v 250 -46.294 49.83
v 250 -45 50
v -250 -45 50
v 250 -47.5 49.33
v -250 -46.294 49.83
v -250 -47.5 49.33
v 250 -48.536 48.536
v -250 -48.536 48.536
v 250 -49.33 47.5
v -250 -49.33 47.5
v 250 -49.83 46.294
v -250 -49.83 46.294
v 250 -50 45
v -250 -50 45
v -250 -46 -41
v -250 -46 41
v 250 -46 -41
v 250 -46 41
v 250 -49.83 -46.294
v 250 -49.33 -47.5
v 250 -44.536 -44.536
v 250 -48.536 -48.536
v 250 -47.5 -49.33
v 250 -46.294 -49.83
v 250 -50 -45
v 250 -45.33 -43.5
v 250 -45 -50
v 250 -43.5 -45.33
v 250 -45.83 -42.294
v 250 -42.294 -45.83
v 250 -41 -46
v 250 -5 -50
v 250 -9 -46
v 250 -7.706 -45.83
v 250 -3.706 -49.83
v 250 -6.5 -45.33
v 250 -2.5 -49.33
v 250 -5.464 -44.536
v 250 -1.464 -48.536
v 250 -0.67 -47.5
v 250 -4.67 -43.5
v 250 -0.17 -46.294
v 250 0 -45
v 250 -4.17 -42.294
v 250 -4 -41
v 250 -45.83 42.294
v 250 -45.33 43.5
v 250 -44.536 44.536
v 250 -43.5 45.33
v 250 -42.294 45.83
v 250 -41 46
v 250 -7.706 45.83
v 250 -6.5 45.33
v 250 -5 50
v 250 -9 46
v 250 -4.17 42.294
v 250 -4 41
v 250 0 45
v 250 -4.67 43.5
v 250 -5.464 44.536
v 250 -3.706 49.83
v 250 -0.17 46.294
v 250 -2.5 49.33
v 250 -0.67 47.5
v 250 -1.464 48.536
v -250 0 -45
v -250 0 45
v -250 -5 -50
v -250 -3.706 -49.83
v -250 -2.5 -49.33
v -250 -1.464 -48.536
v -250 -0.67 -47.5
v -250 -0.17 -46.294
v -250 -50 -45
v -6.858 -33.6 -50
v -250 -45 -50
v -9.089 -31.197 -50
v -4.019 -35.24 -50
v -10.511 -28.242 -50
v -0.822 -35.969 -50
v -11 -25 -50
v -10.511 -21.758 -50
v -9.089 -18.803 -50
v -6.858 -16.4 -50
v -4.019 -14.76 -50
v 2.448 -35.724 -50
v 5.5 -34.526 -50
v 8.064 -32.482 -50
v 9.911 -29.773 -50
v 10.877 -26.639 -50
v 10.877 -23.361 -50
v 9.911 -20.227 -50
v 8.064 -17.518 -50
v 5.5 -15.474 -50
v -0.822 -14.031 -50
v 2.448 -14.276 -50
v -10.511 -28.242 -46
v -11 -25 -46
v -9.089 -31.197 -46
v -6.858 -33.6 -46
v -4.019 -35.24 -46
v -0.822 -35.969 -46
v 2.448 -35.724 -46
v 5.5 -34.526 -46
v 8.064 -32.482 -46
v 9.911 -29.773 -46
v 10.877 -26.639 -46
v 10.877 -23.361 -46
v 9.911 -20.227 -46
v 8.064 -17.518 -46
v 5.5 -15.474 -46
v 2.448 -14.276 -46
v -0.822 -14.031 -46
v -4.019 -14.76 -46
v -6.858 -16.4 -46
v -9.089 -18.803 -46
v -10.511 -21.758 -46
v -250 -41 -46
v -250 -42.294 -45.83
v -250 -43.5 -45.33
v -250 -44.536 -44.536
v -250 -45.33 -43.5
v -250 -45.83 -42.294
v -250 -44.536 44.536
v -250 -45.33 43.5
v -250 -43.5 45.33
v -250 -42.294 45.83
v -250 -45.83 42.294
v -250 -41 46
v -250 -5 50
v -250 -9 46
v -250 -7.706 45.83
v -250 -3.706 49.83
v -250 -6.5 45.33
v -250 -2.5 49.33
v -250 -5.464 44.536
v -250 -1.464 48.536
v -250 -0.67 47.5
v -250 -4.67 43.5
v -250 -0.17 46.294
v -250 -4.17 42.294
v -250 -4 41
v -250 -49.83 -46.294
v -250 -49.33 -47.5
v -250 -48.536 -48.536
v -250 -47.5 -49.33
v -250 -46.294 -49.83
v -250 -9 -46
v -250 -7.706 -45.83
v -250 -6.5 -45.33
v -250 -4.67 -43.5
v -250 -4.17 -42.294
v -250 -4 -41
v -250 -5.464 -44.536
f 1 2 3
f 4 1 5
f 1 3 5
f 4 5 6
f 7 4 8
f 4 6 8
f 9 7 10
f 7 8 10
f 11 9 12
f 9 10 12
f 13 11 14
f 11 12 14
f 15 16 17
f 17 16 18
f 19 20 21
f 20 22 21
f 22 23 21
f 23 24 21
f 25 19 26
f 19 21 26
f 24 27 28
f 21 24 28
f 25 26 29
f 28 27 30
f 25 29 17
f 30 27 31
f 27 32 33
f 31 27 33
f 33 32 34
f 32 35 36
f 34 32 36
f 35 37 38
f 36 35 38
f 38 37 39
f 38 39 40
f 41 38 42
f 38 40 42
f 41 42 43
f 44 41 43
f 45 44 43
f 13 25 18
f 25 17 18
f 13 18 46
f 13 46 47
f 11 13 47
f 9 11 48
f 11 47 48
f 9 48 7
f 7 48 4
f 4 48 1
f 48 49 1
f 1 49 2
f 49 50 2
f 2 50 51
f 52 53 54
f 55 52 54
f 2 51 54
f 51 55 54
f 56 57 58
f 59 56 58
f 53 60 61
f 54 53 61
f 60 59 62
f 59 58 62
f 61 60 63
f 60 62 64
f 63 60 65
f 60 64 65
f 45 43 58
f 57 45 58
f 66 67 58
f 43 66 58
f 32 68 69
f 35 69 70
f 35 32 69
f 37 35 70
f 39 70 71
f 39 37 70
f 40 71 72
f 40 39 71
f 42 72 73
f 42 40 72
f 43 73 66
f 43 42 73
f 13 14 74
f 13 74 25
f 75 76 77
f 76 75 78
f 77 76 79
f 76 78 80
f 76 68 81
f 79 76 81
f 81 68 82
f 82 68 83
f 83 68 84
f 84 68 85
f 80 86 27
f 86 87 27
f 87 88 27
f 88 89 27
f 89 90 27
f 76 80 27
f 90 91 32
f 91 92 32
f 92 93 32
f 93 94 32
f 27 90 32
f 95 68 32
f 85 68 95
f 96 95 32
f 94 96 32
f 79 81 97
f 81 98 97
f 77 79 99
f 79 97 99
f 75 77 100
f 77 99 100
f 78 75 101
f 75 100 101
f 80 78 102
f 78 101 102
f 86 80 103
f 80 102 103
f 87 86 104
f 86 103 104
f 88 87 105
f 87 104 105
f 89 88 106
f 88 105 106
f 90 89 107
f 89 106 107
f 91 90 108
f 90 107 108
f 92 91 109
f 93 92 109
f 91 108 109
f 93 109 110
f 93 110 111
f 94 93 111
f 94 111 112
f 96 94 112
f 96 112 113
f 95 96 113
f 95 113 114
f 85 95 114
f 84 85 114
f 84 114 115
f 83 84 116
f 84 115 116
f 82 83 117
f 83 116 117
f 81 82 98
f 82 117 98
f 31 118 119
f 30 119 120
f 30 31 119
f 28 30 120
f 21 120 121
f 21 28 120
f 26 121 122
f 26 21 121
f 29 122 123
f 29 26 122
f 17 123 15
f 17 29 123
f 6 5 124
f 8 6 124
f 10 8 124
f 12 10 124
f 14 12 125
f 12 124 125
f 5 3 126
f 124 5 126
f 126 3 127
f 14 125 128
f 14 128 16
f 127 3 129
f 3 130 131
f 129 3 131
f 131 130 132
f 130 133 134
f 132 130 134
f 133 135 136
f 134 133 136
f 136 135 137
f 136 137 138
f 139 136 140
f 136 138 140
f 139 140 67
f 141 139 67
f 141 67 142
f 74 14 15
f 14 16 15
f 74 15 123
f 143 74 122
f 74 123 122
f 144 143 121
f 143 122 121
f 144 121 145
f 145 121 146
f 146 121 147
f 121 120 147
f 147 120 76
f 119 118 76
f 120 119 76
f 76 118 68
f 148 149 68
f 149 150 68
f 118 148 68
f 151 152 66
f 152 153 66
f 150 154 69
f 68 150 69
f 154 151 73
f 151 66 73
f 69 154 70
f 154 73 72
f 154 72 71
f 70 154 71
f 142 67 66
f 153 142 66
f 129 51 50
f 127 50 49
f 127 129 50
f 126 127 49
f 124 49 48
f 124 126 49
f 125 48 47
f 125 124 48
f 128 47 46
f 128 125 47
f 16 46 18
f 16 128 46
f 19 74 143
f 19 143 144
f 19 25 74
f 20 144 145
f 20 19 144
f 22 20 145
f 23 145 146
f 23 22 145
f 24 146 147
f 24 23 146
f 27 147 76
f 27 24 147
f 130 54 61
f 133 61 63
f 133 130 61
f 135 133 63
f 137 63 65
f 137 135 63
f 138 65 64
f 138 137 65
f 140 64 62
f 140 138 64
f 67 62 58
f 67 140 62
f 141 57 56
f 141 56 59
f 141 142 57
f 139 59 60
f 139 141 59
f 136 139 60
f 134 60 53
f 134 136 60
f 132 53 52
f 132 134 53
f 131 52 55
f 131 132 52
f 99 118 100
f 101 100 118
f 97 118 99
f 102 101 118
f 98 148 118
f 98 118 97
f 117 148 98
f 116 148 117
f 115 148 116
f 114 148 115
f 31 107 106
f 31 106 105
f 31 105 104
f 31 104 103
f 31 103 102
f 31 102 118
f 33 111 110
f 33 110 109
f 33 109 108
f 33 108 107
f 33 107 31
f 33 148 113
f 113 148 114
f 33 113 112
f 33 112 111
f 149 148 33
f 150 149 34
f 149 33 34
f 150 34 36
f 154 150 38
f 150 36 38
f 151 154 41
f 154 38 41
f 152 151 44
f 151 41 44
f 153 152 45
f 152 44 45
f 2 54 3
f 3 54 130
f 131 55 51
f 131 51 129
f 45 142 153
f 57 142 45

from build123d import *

# Parameters (mm, degrees)
F1_DEPTH = 50
F2_T     = -4
F4_D     = 22
F4_DEPTH = 4
F4_TIP   = 6.6094668093
F5_R     = 5


# Not quite as in the source:
# - a feature names something its author has since deleted; it is built from what else it names


with BuildPart() as f1:
    # F0 (on Front) → F1 (new body)
    with BuildSketch(Plane.XZ):
        Polygon((250, 50), (-250, 50), (-250, -50), (-150, -50), (250, -50), align=None)
    extrude(amount=F1_DEPTH)

    # F2
    f2_openings = [f1.faces().sort_by_distance(p)[0] for p in [
        (250, -25, 0),
        (-250, -25, 0),
    ]]
    offset(amount=F2_T, openings=f2_openings)

    # F4
    with Locations(Plane(origin=(0, 0, -50), x_dir=(1, 0, 0), z_dir=(0, 0, -1))):
        with Locations((0, 25)):
            Hole(F4_D / 2, depth=F4_DEPTH)
            with Locations((0, 0, -(F4_DEPTH + F4_TIP / 2))):  # 118° drill point
                Cone(0, F4_D / 2, F4_TIP, mode=Mode.SUBTRACT)

    # F5
    f5_edges = [f1.edges().sort_by_distance(p)[0] for p in [
        (0, -50, 50),
        (0, -50, -50),
        (0, 0, -50),
        (0, 0, 50),
        (0, -4, -46),
        (0, -46, -46),
        (0, -46, 46),
        (0, -4, 46),
    ]]
    fillet(f5_edges, radius=F5_R)


solid = f1.part
